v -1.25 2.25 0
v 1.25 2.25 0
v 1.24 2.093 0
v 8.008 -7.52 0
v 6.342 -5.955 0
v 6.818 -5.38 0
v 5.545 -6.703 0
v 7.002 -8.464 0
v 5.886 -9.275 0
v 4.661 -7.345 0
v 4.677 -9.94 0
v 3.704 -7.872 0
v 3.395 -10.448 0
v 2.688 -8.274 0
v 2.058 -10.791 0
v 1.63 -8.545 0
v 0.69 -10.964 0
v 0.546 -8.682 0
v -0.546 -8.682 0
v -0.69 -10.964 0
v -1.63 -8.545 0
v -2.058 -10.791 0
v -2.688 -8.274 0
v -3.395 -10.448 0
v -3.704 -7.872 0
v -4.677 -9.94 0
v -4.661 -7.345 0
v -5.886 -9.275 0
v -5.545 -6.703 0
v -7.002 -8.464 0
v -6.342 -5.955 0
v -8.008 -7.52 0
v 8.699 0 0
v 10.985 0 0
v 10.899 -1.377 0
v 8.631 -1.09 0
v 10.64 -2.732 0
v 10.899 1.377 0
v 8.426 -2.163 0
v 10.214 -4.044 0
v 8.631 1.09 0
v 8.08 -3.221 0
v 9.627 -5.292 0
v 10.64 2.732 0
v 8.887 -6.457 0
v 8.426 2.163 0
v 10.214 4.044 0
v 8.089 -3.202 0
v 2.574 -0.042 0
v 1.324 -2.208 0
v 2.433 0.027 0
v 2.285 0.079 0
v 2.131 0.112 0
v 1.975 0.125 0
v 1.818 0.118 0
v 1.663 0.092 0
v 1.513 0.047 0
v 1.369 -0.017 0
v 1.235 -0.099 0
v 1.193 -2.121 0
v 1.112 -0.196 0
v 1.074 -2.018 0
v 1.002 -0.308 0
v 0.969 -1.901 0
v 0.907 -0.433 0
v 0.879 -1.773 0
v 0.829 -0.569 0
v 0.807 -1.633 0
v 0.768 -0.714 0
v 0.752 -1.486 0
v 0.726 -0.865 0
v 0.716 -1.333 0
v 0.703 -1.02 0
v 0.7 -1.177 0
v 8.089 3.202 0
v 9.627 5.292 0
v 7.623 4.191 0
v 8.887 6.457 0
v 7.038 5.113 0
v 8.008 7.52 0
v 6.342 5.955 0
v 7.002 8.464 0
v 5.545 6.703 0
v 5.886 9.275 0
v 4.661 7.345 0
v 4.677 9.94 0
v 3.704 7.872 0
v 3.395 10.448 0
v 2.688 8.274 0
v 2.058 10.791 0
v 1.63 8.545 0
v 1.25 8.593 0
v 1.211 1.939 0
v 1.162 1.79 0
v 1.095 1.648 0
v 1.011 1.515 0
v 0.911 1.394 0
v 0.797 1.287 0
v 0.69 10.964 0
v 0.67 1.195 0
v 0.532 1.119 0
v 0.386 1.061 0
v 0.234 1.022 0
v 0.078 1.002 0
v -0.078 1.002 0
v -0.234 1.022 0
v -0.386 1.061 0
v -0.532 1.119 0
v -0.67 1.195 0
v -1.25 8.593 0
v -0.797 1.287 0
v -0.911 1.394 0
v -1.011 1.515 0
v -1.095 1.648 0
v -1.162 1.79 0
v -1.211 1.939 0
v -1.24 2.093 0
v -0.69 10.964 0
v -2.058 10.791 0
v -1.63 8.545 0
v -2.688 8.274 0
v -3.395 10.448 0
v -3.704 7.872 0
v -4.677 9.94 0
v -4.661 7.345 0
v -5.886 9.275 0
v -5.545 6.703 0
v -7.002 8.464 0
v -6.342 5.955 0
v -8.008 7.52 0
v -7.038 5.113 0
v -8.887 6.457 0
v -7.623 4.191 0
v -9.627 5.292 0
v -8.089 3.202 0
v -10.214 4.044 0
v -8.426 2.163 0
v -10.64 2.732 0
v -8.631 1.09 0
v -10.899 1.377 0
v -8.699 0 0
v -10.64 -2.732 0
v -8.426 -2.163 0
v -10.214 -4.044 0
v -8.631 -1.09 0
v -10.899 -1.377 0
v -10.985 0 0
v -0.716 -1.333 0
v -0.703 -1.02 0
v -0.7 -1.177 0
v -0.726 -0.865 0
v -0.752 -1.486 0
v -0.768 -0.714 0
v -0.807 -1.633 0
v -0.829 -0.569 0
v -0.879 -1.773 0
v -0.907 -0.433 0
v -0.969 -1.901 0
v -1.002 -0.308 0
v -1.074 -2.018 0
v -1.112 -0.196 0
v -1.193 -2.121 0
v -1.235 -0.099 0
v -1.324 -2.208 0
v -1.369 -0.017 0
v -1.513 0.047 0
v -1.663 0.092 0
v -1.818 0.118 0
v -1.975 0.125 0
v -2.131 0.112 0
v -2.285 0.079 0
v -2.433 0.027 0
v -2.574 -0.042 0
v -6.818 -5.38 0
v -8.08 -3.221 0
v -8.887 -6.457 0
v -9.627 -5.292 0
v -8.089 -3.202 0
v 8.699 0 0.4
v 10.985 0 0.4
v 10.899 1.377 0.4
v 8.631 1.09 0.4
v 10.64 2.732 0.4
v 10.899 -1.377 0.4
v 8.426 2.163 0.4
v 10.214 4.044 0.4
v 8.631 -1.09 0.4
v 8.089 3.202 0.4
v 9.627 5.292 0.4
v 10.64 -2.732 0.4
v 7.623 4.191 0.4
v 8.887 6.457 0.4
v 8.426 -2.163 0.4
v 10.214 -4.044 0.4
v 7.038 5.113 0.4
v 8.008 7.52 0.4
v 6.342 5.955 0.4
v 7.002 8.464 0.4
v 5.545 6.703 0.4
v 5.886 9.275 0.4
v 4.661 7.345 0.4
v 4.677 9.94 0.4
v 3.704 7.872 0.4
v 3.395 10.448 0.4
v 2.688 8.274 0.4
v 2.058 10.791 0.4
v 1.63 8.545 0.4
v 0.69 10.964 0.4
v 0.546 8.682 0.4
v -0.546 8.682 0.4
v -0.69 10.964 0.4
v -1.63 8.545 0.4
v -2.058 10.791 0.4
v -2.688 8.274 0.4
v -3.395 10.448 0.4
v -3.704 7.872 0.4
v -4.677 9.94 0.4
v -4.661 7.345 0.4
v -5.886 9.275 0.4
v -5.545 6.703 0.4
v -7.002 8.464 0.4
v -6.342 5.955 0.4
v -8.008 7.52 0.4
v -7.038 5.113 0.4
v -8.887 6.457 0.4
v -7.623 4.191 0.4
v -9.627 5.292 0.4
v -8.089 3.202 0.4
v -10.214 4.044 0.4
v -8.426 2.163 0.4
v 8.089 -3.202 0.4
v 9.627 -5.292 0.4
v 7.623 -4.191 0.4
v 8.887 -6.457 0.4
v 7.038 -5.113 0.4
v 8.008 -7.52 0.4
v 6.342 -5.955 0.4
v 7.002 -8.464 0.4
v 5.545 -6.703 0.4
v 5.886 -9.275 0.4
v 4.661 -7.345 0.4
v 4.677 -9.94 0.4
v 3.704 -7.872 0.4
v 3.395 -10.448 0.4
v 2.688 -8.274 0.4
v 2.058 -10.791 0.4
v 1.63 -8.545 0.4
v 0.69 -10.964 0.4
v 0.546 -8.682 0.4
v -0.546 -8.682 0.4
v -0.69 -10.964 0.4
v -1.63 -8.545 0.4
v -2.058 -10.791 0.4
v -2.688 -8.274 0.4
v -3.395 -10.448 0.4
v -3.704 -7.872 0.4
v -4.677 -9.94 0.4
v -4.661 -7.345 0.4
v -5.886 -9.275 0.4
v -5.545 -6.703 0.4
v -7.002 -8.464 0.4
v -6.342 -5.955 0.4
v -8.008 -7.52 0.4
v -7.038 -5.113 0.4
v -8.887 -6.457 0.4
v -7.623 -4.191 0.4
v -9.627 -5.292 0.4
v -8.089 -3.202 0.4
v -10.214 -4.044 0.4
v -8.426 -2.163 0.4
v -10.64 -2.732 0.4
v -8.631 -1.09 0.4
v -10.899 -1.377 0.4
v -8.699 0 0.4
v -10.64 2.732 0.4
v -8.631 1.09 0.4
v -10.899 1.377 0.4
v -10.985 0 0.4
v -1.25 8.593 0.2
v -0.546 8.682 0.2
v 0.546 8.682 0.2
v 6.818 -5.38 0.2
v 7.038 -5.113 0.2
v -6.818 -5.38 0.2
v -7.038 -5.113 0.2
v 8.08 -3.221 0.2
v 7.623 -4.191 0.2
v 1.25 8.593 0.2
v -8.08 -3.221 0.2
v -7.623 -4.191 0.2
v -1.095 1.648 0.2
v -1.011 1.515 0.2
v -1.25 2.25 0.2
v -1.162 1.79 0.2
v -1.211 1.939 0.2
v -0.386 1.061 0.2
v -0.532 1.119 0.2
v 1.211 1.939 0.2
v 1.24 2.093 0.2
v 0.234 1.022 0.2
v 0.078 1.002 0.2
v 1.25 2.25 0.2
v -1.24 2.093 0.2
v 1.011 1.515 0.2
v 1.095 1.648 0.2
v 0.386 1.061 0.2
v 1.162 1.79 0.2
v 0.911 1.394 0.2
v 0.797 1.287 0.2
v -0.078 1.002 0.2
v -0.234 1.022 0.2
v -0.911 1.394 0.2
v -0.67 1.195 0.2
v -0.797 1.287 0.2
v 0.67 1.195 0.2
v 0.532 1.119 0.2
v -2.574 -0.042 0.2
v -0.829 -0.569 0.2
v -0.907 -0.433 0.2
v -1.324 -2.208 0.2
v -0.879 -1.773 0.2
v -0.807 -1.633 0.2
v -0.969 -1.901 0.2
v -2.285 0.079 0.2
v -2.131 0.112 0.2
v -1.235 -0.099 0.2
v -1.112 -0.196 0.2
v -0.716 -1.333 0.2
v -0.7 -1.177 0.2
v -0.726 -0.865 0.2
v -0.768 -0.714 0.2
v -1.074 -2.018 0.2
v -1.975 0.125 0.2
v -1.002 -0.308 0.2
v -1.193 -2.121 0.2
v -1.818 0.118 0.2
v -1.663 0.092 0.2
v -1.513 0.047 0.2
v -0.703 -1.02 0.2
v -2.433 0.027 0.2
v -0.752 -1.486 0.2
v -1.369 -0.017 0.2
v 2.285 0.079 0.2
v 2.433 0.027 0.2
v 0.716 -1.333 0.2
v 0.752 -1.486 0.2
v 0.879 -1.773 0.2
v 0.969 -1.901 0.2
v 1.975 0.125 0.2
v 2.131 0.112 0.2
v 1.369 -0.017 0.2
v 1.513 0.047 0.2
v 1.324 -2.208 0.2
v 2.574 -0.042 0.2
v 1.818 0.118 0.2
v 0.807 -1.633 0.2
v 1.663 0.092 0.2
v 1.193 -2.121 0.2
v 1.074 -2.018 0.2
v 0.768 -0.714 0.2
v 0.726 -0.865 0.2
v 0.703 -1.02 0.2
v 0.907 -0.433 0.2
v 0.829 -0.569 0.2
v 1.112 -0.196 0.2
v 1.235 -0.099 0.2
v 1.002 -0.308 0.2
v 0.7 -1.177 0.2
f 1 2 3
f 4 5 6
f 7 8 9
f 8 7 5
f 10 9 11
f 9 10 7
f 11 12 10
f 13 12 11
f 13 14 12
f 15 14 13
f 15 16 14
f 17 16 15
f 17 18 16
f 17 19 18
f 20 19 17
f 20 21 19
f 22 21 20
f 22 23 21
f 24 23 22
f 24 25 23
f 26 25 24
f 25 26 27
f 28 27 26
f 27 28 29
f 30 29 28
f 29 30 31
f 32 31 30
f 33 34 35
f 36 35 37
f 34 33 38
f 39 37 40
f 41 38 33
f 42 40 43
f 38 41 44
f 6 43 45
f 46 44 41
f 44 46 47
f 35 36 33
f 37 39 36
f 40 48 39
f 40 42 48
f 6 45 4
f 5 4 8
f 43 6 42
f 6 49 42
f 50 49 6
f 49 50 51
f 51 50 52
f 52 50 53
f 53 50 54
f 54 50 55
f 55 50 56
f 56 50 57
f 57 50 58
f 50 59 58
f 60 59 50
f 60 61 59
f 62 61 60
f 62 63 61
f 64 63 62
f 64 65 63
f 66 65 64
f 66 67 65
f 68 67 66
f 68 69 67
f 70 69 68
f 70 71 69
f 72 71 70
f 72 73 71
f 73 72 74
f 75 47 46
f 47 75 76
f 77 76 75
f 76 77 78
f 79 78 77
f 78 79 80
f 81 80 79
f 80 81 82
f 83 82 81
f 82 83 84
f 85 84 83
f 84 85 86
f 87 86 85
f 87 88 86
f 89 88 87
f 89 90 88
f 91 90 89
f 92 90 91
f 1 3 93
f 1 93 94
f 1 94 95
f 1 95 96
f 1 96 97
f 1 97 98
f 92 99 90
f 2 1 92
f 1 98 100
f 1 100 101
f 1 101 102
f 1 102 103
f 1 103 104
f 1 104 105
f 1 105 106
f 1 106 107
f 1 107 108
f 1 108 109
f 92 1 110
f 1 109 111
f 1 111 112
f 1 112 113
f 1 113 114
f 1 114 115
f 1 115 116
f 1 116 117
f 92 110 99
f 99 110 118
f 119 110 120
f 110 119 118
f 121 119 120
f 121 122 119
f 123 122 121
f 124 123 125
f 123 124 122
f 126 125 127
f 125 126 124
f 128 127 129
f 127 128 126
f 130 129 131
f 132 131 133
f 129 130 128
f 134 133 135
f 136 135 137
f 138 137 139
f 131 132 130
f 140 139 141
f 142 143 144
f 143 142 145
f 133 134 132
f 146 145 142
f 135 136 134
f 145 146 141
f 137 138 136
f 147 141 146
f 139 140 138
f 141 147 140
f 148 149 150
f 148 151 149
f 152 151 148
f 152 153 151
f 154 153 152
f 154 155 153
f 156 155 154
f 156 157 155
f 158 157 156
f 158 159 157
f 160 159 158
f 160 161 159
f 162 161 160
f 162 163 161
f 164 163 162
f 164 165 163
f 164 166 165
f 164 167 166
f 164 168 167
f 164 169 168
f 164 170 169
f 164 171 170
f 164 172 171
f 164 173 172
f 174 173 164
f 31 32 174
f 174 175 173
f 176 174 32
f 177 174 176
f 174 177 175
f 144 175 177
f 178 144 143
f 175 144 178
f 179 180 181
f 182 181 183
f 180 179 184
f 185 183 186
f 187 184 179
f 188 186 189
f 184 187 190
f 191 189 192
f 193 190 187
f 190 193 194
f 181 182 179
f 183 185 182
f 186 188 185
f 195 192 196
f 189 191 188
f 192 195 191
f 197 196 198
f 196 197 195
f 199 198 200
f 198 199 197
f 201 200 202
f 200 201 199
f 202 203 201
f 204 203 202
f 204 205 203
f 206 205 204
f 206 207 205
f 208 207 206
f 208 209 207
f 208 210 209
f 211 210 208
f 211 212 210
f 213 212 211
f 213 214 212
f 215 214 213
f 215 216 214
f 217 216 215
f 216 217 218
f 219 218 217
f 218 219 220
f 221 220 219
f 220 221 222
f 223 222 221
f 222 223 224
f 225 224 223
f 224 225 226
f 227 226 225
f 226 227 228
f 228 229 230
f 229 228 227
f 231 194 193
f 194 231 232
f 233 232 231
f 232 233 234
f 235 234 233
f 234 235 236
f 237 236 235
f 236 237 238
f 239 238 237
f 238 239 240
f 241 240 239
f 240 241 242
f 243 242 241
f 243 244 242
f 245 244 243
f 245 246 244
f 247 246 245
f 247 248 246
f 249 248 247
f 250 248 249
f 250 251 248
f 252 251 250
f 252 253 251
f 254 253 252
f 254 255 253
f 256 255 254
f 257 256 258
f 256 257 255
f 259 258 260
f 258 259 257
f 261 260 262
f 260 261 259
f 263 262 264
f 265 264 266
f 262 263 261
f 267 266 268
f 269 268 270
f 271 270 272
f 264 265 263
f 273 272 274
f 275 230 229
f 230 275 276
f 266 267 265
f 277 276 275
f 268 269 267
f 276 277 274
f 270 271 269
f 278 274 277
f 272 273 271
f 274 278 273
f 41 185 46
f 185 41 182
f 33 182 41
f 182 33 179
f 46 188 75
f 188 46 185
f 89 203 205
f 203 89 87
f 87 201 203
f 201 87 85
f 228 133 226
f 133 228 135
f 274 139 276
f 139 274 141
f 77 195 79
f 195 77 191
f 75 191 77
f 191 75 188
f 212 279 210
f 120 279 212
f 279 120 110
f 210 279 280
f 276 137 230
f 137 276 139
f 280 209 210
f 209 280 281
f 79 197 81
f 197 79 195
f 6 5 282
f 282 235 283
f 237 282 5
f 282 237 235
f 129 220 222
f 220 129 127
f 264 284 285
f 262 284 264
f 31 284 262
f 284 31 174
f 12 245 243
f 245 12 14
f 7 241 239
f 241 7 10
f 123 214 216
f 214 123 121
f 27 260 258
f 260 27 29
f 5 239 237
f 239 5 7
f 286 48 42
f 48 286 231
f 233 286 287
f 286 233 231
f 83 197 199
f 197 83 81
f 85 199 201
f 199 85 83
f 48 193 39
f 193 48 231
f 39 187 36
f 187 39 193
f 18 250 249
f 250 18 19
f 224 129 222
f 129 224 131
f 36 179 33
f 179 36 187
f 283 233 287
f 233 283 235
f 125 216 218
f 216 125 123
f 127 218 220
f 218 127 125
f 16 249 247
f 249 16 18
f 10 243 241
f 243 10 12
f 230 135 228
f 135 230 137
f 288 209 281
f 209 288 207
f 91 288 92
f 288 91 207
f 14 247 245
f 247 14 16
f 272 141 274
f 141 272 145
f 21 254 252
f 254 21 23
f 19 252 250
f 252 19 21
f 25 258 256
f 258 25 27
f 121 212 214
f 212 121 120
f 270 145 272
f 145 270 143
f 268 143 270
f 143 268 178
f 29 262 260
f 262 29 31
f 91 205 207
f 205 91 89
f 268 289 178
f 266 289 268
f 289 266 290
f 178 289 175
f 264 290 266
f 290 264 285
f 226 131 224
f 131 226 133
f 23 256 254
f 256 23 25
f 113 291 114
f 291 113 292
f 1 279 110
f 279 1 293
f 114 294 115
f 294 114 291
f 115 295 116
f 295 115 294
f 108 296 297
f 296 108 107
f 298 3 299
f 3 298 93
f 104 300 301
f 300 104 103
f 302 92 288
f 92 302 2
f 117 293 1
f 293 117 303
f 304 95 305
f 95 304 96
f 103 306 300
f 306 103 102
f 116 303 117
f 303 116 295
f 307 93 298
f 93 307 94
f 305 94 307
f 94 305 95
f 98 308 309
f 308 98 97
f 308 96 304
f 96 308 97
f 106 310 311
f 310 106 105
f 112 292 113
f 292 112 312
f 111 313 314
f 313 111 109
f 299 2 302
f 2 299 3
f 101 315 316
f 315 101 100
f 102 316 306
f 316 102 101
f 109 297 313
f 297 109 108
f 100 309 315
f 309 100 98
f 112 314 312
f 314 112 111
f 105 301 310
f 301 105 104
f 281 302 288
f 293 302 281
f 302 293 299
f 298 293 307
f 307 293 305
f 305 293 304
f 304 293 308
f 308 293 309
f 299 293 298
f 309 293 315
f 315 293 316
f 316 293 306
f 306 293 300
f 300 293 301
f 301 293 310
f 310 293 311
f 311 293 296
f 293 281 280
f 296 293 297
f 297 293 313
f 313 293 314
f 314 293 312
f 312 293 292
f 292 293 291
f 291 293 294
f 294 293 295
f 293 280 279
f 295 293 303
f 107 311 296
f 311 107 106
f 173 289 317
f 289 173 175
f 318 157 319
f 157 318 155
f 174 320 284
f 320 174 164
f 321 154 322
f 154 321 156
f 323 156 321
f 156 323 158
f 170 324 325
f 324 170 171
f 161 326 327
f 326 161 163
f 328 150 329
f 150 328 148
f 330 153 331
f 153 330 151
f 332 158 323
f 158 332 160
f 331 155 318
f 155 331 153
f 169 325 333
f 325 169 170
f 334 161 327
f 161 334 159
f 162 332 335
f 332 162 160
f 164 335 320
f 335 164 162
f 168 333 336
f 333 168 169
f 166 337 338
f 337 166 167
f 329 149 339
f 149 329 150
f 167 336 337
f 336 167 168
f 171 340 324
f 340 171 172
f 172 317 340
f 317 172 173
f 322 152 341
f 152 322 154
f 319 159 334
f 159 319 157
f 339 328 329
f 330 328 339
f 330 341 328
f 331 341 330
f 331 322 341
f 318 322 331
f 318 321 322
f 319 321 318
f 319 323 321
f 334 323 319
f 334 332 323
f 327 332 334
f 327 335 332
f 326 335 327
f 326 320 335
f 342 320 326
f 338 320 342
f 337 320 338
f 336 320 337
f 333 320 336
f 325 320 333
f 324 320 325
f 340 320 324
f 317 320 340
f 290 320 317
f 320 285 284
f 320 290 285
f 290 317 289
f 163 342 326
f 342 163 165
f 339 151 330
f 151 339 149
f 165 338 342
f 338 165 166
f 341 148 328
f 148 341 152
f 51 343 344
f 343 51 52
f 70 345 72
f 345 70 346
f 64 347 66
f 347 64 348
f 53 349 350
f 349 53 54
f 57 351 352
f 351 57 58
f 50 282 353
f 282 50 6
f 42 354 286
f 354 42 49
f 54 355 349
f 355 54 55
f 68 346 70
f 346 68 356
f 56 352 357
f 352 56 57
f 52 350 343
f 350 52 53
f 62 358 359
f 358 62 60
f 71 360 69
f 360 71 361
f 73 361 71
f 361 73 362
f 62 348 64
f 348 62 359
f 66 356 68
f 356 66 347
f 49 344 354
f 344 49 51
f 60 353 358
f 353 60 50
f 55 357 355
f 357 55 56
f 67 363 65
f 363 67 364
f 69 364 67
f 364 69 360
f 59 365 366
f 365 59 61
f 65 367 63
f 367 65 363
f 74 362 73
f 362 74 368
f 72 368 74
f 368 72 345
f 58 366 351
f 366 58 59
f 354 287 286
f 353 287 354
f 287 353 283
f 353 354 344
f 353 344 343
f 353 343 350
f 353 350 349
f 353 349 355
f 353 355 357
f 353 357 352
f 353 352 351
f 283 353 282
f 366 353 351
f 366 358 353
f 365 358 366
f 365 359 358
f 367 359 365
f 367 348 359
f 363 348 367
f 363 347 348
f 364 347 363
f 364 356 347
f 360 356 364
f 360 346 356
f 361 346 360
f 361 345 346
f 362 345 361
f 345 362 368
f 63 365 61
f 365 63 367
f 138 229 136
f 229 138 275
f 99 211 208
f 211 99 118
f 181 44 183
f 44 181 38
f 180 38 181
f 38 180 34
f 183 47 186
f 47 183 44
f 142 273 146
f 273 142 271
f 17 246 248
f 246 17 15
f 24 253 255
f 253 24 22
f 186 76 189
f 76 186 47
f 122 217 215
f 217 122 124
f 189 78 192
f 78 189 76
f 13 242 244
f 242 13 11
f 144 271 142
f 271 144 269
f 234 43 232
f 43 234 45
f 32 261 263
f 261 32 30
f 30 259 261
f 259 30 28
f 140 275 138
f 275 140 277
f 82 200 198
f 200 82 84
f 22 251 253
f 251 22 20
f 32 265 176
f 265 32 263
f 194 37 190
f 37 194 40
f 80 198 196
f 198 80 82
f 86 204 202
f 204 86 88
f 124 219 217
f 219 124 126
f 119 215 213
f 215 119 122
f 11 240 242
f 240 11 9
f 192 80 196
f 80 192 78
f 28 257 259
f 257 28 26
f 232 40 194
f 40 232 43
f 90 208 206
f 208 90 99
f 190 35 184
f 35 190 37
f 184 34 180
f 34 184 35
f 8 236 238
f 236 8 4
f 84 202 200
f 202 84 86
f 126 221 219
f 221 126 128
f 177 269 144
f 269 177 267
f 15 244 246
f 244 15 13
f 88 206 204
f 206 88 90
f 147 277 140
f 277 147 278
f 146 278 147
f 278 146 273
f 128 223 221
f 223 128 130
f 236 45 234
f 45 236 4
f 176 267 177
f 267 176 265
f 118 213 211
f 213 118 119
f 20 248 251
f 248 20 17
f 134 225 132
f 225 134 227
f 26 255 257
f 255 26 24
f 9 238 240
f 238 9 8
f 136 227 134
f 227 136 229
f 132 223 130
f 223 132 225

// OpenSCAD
//  Outer diameter
OD_inch = 0.865;
//  Inner diameter
ID_inch = 0.685;
Lip_Thickness = 0.4;
//  Number of prongs
N = 3;
//  Distance from prong edge to center
D = 1;
//  Prong diameter
PD = 2.5;
Prong_Thickness=0.2;
//  Facets for circles
$fn=50;

anti_rollout();

module anti_rollout() {
	intersection() {
		cylinder(h=Lip_Thickness*3, r=25.4*OD_inch/2, center=true);
		union() {
			difference() {
				cylinder(h=Lip_Thickness, r=1.01*25.4*OD_inch/2);
				cylinder(h=Lip_Thickness*3, r=25.4*ID_inch/2, center=true);
			}
			for (a=[0:N-1]) rotate([0,0,360*a/N]) hull() {
					translate([0,D+PD/2,0]) cylinder(h=Prong_Thickness,r=PD/2);
					translate([0,25.4*ID_inch/2,0]) cylinder(h=Prong_Thickness,r=PD/2);
			}
		}
	}
}
